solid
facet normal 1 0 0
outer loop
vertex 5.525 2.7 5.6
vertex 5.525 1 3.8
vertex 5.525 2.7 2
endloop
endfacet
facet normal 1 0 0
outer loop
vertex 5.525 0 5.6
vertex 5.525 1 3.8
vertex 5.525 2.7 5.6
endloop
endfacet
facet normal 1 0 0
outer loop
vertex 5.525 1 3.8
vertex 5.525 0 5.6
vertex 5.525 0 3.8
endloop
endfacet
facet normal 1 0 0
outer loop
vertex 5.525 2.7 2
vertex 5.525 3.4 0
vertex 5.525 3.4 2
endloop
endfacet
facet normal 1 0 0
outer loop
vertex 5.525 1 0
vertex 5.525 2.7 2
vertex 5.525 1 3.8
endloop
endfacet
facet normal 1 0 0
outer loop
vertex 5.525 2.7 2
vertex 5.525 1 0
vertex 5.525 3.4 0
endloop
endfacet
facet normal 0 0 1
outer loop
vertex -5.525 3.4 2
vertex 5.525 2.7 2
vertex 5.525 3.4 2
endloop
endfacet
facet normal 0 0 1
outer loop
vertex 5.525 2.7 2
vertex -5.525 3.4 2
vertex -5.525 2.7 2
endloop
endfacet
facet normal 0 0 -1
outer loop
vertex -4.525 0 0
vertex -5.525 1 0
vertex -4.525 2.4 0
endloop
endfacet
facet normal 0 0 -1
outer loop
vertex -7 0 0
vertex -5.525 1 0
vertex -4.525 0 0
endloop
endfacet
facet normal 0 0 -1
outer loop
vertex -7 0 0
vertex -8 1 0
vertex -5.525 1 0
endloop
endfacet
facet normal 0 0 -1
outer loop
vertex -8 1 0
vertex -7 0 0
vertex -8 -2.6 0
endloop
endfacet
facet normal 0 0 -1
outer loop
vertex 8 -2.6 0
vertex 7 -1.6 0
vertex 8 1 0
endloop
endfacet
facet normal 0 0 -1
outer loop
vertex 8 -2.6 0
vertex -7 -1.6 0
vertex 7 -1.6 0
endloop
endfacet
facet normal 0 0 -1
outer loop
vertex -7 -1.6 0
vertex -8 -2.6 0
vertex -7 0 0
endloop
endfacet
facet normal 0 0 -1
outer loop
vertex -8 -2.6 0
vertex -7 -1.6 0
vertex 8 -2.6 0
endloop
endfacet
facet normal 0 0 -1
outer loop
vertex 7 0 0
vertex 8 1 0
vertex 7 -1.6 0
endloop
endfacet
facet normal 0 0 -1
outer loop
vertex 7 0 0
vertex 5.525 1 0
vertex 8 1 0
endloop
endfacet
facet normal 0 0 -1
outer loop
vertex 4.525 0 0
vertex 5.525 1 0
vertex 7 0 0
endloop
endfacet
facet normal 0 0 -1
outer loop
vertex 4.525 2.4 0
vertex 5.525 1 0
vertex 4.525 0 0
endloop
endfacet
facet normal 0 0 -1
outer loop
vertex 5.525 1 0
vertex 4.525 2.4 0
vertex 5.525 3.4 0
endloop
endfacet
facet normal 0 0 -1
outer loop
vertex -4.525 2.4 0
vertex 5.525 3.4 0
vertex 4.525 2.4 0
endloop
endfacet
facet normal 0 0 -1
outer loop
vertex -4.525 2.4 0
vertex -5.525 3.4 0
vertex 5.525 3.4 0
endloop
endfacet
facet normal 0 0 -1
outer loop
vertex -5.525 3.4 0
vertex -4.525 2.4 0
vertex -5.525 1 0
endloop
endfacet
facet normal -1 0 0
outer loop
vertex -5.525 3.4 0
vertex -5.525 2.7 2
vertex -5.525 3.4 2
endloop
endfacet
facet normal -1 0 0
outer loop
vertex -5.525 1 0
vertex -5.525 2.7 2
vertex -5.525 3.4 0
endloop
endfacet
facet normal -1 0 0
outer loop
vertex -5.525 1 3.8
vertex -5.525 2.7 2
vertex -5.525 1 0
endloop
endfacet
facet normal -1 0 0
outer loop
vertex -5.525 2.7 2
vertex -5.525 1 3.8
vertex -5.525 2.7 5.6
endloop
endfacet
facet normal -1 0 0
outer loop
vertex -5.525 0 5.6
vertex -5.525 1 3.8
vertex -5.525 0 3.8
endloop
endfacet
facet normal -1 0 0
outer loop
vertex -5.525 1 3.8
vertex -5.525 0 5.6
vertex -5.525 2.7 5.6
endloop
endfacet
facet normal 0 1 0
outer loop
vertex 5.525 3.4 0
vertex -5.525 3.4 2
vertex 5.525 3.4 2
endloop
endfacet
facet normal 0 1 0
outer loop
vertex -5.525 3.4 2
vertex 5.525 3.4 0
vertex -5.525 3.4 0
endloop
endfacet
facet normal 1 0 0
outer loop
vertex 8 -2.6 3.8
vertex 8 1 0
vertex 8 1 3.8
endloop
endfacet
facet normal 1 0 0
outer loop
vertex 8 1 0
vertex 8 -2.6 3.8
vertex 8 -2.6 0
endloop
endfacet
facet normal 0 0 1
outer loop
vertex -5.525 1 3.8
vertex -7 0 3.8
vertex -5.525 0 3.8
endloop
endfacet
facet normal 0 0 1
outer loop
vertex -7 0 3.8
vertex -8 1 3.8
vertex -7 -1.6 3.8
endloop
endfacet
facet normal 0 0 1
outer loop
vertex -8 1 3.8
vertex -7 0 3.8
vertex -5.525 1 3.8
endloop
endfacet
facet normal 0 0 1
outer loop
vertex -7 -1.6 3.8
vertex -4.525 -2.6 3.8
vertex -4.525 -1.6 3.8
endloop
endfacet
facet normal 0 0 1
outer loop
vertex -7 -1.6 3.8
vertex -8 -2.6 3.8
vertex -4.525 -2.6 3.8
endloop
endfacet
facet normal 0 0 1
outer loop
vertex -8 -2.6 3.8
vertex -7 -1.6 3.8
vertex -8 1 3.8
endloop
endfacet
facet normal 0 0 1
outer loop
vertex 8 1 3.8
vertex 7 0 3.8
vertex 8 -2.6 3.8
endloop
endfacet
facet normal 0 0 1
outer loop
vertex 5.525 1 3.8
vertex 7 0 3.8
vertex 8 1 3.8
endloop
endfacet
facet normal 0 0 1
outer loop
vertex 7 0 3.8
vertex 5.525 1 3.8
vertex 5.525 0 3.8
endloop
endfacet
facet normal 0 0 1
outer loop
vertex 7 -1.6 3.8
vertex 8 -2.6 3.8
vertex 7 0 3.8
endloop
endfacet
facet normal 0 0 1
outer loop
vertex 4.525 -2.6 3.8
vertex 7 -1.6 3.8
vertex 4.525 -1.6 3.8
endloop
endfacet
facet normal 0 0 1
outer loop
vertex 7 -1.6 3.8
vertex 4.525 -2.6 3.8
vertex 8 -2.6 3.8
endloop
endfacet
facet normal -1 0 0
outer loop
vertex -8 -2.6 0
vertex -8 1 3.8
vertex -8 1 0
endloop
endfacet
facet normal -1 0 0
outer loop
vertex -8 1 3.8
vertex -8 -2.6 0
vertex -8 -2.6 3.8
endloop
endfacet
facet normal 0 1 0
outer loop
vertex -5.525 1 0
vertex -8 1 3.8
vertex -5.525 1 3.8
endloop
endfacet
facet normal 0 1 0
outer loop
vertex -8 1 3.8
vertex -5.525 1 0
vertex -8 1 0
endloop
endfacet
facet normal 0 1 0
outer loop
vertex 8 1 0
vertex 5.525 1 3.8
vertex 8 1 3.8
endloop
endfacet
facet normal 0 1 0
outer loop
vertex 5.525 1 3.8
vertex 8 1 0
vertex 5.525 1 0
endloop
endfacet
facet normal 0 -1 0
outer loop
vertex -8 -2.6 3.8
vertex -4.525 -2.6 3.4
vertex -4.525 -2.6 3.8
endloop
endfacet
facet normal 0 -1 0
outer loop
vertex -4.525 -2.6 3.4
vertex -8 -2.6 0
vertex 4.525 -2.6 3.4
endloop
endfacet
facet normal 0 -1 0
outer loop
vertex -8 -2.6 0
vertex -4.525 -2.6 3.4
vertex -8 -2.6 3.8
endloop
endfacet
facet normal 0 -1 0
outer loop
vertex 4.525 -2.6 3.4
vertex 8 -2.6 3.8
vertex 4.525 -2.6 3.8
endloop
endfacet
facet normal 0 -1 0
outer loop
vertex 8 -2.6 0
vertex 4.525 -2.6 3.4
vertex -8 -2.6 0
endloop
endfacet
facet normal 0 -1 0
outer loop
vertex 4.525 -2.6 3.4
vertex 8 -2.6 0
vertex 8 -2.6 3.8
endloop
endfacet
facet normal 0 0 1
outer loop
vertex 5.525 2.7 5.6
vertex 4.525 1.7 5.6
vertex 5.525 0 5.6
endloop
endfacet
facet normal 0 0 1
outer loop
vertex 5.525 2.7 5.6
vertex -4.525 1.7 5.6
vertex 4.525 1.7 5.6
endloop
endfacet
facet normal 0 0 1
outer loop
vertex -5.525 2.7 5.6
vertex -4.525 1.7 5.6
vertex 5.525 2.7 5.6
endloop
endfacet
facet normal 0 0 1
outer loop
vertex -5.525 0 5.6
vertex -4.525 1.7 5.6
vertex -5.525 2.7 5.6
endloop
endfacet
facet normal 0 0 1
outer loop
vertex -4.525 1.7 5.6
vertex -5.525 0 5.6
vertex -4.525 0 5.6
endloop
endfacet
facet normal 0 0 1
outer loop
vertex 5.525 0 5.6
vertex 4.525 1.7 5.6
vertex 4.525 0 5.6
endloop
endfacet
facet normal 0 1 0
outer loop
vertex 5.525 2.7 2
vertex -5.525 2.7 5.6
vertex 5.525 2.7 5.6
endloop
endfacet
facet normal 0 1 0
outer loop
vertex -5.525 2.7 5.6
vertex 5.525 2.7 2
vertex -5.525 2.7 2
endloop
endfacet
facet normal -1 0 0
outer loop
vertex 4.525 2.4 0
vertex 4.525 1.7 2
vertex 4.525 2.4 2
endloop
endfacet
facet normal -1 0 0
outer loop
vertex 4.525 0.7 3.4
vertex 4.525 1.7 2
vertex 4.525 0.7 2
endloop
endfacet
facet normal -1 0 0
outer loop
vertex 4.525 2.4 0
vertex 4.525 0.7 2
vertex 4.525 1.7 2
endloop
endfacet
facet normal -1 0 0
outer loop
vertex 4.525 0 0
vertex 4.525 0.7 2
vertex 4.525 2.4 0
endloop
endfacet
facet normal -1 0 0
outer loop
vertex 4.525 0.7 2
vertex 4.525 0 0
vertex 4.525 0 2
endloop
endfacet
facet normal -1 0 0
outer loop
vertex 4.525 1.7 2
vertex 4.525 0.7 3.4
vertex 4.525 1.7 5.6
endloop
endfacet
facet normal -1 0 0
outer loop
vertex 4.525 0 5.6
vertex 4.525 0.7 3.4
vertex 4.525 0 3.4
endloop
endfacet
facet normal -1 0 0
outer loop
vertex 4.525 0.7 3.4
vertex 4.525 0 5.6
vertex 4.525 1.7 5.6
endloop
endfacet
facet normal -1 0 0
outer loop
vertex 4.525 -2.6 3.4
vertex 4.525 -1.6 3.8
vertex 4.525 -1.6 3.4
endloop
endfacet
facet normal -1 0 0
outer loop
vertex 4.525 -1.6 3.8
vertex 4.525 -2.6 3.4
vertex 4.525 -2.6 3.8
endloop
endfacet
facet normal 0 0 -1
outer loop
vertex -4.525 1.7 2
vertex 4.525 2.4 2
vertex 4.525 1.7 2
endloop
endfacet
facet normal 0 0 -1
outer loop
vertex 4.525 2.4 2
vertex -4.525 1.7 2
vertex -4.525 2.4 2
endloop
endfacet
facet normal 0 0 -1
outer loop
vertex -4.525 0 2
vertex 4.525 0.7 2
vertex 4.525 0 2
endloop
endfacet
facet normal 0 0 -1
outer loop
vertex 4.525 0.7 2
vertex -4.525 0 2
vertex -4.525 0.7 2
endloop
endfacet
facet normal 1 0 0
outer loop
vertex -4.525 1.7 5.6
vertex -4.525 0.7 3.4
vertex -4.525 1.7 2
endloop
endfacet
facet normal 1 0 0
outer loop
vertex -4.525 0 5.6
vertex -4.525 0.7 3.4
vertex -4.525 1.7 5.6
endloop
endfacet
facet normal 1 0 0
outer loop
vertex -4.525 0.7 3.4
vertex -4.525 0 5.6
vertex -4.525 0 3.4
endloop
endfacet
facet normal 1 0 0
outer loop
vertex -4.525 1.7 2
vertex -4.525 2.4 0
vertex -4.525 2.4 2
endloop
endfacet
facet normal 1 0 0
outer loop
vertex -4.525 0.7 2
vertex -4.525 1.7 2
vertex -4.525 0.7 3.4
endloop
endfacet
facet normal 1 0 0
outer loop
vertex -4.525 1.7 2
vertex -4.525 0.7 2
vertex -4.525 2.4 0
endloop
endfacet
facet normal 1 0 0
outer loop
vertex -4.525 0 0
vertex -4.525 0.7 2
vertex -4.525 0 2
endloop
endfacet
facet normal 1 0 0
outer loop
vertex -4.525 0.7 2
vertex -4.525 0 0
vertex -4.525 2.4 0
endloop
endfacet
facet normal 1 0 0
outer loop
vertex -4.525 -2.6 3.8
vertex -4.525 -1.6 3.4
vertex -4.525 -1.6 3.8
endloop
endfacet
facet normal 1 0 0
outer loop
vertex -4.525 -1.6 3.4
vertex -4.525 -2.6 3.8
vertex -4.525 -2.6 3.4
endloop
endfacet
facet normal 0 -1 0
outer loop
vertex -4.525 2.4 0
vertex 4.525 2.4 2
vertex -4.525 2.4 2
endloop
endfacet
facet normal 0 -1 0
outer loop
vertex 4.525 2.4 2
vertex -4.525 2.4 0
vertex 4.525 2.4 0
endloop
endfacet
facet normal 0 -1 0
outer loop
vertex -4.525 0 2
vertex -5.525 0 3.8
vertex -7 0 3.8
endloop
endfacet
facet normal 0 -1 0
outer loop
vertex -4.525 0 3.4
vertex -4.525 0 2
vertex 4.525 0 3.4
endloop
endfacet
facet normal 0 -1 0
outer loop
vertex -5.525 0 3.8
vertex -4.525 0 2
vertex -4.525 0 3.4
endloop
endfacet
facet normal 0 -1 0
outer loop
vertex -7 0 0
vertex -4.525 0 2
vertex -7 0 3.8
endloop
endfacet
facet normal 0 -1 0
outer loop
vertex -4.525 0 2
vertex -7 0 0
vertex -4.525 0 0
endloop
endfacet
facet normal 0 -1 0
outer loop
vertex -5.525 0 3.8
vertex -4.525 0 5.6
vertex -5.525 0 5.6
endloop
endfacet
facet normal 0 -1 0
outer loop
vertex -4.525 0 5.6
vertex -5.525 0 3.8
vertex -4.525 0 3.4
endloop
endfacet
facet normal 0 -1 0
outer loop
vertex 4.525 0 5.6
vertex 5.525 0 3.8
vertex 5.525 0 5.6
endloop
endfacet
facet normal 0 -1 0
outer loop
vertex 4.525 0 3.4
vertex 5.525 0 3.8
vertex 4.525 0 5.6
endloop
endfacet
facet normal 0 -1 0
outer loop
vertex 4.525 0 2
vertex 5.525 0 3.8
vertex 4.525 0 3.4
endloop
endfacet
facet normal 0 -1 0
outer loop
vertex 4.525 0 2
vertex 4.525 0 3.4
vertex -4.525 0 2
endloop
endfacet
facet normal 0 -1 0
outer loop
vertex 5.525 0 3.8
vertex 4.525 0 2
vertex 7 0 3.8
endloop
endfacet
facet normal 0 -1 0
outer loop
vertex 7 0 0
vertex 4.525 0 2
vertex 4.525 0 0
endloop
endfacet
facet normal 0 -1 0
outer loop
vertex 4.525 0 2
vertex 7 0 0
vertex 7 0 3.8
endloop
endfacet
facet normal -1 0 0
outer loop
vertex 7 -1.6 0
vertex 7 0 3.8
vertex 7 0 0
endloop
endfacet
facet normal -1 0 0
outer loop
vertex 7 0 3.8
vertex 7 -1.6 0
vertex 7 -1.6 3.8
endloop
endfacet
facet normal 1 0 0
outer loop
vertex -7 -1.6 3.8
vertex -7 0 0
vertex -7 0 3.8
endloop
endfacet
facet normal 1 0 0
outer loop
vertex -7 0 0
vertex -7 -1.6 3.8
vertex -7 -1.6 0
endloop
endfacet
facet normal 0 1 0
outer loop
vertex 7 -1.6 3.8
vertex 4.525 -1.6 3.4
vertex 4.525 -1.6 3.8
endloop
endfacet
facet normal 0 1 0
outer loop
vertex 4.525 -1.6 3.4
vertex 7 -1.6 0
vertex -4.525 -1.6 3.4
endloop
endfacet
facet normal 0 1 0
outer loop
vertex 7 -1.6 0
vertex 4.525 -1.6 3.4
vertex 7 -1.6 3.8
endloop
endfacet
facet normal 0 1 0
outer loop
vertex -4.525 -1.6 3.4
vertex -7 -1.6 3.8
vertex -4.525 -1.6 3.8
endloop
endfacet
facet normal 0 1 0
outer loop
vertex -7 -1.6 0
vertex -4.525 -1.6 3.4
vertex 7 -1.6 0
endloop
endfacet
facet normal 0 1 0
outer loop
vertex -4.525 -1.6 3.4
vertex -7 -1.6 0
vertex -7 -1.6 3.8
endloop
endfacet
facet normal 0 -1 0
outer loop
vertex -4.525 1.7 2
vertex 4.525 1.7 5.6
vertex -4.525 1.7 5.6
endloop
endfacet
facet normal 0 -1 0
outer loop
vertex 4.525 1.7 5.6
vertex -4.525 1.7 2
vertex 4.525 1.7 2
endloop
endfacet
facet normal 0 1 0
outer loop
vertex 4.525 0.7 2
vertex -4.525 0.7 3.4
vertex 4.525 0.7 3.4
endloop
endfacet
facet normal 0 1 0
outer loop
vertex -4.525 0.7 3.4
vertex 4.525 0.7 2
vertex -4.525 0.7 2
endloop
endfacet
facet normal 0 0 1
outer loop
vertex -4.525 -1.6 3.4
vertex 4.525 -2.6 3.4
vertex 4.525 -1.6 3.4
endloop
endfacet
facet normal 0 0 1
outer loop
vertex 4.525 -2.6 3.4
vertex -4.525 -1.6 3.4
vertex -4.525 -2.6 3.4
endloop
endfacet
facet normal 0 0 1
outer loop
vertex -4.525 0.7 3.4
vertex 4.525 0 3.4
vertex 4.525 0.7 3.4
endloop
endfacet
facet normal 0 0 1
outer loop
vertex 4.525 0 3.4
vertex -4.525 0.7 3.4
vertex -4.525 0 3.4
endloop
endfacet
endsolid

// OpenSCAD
$fn=32;


usbc_width = 9.05; // 9.1
usbc_thickness = 1;
usbc_pcb_length = 5.6;

pad_length = 2.2;

holder_thickness = 2.4;
holder_length = 2;

pcb_thickness = 1.6;

pcb_width = 14;
pcb_length = (5.4 + 2.2)/2;

th = 1; 

difference() {
union() {
    translate([-usbc_width/2 - th,  -th, 0])
    cube([usbc_width + 2*th, holder_thickness + 2*th, holder_length]);
    
    translate([-pcb_width/2 - th, -pcb_thickness - th, 0])
    cube([pcb_width + 2*th, pcb_thickness + 2*th, pcb_length]);
    
    translate([-usbc_width/2 - th, -th + (holder_thickness - usbc_thickness)/2, 0])
    cube([usbc_width + 2*th, usbc_thickness + 2*th, usbc_pcb_length]);
}

    translate([-usbc_width/2, 0, 0])
    cube([usbc_width, holder_thickness, holder_length]);
    
    translate([-pcb_width/2, -pcb_thickness, 0])
    cube([pcb_width, pcb_thickness, pcb_length + 10]);

    echo(usbc_pcb_length - pad_length);
    translate([-usbc_width/2, (holder_thickness - usbc_thickness)/2, 0])
    cube([usbc_width, usbc_thickness, usbc_pcb_length]);
    translate([-usbc_width/2, -pcb_thickness - th, usbc_pcb_length - pad_length])
    cube([usbc_width, (usbc_thickness+holder_thickness)/2 + pcb_thickness + th, usbc_pcb_length + 10]);
}
